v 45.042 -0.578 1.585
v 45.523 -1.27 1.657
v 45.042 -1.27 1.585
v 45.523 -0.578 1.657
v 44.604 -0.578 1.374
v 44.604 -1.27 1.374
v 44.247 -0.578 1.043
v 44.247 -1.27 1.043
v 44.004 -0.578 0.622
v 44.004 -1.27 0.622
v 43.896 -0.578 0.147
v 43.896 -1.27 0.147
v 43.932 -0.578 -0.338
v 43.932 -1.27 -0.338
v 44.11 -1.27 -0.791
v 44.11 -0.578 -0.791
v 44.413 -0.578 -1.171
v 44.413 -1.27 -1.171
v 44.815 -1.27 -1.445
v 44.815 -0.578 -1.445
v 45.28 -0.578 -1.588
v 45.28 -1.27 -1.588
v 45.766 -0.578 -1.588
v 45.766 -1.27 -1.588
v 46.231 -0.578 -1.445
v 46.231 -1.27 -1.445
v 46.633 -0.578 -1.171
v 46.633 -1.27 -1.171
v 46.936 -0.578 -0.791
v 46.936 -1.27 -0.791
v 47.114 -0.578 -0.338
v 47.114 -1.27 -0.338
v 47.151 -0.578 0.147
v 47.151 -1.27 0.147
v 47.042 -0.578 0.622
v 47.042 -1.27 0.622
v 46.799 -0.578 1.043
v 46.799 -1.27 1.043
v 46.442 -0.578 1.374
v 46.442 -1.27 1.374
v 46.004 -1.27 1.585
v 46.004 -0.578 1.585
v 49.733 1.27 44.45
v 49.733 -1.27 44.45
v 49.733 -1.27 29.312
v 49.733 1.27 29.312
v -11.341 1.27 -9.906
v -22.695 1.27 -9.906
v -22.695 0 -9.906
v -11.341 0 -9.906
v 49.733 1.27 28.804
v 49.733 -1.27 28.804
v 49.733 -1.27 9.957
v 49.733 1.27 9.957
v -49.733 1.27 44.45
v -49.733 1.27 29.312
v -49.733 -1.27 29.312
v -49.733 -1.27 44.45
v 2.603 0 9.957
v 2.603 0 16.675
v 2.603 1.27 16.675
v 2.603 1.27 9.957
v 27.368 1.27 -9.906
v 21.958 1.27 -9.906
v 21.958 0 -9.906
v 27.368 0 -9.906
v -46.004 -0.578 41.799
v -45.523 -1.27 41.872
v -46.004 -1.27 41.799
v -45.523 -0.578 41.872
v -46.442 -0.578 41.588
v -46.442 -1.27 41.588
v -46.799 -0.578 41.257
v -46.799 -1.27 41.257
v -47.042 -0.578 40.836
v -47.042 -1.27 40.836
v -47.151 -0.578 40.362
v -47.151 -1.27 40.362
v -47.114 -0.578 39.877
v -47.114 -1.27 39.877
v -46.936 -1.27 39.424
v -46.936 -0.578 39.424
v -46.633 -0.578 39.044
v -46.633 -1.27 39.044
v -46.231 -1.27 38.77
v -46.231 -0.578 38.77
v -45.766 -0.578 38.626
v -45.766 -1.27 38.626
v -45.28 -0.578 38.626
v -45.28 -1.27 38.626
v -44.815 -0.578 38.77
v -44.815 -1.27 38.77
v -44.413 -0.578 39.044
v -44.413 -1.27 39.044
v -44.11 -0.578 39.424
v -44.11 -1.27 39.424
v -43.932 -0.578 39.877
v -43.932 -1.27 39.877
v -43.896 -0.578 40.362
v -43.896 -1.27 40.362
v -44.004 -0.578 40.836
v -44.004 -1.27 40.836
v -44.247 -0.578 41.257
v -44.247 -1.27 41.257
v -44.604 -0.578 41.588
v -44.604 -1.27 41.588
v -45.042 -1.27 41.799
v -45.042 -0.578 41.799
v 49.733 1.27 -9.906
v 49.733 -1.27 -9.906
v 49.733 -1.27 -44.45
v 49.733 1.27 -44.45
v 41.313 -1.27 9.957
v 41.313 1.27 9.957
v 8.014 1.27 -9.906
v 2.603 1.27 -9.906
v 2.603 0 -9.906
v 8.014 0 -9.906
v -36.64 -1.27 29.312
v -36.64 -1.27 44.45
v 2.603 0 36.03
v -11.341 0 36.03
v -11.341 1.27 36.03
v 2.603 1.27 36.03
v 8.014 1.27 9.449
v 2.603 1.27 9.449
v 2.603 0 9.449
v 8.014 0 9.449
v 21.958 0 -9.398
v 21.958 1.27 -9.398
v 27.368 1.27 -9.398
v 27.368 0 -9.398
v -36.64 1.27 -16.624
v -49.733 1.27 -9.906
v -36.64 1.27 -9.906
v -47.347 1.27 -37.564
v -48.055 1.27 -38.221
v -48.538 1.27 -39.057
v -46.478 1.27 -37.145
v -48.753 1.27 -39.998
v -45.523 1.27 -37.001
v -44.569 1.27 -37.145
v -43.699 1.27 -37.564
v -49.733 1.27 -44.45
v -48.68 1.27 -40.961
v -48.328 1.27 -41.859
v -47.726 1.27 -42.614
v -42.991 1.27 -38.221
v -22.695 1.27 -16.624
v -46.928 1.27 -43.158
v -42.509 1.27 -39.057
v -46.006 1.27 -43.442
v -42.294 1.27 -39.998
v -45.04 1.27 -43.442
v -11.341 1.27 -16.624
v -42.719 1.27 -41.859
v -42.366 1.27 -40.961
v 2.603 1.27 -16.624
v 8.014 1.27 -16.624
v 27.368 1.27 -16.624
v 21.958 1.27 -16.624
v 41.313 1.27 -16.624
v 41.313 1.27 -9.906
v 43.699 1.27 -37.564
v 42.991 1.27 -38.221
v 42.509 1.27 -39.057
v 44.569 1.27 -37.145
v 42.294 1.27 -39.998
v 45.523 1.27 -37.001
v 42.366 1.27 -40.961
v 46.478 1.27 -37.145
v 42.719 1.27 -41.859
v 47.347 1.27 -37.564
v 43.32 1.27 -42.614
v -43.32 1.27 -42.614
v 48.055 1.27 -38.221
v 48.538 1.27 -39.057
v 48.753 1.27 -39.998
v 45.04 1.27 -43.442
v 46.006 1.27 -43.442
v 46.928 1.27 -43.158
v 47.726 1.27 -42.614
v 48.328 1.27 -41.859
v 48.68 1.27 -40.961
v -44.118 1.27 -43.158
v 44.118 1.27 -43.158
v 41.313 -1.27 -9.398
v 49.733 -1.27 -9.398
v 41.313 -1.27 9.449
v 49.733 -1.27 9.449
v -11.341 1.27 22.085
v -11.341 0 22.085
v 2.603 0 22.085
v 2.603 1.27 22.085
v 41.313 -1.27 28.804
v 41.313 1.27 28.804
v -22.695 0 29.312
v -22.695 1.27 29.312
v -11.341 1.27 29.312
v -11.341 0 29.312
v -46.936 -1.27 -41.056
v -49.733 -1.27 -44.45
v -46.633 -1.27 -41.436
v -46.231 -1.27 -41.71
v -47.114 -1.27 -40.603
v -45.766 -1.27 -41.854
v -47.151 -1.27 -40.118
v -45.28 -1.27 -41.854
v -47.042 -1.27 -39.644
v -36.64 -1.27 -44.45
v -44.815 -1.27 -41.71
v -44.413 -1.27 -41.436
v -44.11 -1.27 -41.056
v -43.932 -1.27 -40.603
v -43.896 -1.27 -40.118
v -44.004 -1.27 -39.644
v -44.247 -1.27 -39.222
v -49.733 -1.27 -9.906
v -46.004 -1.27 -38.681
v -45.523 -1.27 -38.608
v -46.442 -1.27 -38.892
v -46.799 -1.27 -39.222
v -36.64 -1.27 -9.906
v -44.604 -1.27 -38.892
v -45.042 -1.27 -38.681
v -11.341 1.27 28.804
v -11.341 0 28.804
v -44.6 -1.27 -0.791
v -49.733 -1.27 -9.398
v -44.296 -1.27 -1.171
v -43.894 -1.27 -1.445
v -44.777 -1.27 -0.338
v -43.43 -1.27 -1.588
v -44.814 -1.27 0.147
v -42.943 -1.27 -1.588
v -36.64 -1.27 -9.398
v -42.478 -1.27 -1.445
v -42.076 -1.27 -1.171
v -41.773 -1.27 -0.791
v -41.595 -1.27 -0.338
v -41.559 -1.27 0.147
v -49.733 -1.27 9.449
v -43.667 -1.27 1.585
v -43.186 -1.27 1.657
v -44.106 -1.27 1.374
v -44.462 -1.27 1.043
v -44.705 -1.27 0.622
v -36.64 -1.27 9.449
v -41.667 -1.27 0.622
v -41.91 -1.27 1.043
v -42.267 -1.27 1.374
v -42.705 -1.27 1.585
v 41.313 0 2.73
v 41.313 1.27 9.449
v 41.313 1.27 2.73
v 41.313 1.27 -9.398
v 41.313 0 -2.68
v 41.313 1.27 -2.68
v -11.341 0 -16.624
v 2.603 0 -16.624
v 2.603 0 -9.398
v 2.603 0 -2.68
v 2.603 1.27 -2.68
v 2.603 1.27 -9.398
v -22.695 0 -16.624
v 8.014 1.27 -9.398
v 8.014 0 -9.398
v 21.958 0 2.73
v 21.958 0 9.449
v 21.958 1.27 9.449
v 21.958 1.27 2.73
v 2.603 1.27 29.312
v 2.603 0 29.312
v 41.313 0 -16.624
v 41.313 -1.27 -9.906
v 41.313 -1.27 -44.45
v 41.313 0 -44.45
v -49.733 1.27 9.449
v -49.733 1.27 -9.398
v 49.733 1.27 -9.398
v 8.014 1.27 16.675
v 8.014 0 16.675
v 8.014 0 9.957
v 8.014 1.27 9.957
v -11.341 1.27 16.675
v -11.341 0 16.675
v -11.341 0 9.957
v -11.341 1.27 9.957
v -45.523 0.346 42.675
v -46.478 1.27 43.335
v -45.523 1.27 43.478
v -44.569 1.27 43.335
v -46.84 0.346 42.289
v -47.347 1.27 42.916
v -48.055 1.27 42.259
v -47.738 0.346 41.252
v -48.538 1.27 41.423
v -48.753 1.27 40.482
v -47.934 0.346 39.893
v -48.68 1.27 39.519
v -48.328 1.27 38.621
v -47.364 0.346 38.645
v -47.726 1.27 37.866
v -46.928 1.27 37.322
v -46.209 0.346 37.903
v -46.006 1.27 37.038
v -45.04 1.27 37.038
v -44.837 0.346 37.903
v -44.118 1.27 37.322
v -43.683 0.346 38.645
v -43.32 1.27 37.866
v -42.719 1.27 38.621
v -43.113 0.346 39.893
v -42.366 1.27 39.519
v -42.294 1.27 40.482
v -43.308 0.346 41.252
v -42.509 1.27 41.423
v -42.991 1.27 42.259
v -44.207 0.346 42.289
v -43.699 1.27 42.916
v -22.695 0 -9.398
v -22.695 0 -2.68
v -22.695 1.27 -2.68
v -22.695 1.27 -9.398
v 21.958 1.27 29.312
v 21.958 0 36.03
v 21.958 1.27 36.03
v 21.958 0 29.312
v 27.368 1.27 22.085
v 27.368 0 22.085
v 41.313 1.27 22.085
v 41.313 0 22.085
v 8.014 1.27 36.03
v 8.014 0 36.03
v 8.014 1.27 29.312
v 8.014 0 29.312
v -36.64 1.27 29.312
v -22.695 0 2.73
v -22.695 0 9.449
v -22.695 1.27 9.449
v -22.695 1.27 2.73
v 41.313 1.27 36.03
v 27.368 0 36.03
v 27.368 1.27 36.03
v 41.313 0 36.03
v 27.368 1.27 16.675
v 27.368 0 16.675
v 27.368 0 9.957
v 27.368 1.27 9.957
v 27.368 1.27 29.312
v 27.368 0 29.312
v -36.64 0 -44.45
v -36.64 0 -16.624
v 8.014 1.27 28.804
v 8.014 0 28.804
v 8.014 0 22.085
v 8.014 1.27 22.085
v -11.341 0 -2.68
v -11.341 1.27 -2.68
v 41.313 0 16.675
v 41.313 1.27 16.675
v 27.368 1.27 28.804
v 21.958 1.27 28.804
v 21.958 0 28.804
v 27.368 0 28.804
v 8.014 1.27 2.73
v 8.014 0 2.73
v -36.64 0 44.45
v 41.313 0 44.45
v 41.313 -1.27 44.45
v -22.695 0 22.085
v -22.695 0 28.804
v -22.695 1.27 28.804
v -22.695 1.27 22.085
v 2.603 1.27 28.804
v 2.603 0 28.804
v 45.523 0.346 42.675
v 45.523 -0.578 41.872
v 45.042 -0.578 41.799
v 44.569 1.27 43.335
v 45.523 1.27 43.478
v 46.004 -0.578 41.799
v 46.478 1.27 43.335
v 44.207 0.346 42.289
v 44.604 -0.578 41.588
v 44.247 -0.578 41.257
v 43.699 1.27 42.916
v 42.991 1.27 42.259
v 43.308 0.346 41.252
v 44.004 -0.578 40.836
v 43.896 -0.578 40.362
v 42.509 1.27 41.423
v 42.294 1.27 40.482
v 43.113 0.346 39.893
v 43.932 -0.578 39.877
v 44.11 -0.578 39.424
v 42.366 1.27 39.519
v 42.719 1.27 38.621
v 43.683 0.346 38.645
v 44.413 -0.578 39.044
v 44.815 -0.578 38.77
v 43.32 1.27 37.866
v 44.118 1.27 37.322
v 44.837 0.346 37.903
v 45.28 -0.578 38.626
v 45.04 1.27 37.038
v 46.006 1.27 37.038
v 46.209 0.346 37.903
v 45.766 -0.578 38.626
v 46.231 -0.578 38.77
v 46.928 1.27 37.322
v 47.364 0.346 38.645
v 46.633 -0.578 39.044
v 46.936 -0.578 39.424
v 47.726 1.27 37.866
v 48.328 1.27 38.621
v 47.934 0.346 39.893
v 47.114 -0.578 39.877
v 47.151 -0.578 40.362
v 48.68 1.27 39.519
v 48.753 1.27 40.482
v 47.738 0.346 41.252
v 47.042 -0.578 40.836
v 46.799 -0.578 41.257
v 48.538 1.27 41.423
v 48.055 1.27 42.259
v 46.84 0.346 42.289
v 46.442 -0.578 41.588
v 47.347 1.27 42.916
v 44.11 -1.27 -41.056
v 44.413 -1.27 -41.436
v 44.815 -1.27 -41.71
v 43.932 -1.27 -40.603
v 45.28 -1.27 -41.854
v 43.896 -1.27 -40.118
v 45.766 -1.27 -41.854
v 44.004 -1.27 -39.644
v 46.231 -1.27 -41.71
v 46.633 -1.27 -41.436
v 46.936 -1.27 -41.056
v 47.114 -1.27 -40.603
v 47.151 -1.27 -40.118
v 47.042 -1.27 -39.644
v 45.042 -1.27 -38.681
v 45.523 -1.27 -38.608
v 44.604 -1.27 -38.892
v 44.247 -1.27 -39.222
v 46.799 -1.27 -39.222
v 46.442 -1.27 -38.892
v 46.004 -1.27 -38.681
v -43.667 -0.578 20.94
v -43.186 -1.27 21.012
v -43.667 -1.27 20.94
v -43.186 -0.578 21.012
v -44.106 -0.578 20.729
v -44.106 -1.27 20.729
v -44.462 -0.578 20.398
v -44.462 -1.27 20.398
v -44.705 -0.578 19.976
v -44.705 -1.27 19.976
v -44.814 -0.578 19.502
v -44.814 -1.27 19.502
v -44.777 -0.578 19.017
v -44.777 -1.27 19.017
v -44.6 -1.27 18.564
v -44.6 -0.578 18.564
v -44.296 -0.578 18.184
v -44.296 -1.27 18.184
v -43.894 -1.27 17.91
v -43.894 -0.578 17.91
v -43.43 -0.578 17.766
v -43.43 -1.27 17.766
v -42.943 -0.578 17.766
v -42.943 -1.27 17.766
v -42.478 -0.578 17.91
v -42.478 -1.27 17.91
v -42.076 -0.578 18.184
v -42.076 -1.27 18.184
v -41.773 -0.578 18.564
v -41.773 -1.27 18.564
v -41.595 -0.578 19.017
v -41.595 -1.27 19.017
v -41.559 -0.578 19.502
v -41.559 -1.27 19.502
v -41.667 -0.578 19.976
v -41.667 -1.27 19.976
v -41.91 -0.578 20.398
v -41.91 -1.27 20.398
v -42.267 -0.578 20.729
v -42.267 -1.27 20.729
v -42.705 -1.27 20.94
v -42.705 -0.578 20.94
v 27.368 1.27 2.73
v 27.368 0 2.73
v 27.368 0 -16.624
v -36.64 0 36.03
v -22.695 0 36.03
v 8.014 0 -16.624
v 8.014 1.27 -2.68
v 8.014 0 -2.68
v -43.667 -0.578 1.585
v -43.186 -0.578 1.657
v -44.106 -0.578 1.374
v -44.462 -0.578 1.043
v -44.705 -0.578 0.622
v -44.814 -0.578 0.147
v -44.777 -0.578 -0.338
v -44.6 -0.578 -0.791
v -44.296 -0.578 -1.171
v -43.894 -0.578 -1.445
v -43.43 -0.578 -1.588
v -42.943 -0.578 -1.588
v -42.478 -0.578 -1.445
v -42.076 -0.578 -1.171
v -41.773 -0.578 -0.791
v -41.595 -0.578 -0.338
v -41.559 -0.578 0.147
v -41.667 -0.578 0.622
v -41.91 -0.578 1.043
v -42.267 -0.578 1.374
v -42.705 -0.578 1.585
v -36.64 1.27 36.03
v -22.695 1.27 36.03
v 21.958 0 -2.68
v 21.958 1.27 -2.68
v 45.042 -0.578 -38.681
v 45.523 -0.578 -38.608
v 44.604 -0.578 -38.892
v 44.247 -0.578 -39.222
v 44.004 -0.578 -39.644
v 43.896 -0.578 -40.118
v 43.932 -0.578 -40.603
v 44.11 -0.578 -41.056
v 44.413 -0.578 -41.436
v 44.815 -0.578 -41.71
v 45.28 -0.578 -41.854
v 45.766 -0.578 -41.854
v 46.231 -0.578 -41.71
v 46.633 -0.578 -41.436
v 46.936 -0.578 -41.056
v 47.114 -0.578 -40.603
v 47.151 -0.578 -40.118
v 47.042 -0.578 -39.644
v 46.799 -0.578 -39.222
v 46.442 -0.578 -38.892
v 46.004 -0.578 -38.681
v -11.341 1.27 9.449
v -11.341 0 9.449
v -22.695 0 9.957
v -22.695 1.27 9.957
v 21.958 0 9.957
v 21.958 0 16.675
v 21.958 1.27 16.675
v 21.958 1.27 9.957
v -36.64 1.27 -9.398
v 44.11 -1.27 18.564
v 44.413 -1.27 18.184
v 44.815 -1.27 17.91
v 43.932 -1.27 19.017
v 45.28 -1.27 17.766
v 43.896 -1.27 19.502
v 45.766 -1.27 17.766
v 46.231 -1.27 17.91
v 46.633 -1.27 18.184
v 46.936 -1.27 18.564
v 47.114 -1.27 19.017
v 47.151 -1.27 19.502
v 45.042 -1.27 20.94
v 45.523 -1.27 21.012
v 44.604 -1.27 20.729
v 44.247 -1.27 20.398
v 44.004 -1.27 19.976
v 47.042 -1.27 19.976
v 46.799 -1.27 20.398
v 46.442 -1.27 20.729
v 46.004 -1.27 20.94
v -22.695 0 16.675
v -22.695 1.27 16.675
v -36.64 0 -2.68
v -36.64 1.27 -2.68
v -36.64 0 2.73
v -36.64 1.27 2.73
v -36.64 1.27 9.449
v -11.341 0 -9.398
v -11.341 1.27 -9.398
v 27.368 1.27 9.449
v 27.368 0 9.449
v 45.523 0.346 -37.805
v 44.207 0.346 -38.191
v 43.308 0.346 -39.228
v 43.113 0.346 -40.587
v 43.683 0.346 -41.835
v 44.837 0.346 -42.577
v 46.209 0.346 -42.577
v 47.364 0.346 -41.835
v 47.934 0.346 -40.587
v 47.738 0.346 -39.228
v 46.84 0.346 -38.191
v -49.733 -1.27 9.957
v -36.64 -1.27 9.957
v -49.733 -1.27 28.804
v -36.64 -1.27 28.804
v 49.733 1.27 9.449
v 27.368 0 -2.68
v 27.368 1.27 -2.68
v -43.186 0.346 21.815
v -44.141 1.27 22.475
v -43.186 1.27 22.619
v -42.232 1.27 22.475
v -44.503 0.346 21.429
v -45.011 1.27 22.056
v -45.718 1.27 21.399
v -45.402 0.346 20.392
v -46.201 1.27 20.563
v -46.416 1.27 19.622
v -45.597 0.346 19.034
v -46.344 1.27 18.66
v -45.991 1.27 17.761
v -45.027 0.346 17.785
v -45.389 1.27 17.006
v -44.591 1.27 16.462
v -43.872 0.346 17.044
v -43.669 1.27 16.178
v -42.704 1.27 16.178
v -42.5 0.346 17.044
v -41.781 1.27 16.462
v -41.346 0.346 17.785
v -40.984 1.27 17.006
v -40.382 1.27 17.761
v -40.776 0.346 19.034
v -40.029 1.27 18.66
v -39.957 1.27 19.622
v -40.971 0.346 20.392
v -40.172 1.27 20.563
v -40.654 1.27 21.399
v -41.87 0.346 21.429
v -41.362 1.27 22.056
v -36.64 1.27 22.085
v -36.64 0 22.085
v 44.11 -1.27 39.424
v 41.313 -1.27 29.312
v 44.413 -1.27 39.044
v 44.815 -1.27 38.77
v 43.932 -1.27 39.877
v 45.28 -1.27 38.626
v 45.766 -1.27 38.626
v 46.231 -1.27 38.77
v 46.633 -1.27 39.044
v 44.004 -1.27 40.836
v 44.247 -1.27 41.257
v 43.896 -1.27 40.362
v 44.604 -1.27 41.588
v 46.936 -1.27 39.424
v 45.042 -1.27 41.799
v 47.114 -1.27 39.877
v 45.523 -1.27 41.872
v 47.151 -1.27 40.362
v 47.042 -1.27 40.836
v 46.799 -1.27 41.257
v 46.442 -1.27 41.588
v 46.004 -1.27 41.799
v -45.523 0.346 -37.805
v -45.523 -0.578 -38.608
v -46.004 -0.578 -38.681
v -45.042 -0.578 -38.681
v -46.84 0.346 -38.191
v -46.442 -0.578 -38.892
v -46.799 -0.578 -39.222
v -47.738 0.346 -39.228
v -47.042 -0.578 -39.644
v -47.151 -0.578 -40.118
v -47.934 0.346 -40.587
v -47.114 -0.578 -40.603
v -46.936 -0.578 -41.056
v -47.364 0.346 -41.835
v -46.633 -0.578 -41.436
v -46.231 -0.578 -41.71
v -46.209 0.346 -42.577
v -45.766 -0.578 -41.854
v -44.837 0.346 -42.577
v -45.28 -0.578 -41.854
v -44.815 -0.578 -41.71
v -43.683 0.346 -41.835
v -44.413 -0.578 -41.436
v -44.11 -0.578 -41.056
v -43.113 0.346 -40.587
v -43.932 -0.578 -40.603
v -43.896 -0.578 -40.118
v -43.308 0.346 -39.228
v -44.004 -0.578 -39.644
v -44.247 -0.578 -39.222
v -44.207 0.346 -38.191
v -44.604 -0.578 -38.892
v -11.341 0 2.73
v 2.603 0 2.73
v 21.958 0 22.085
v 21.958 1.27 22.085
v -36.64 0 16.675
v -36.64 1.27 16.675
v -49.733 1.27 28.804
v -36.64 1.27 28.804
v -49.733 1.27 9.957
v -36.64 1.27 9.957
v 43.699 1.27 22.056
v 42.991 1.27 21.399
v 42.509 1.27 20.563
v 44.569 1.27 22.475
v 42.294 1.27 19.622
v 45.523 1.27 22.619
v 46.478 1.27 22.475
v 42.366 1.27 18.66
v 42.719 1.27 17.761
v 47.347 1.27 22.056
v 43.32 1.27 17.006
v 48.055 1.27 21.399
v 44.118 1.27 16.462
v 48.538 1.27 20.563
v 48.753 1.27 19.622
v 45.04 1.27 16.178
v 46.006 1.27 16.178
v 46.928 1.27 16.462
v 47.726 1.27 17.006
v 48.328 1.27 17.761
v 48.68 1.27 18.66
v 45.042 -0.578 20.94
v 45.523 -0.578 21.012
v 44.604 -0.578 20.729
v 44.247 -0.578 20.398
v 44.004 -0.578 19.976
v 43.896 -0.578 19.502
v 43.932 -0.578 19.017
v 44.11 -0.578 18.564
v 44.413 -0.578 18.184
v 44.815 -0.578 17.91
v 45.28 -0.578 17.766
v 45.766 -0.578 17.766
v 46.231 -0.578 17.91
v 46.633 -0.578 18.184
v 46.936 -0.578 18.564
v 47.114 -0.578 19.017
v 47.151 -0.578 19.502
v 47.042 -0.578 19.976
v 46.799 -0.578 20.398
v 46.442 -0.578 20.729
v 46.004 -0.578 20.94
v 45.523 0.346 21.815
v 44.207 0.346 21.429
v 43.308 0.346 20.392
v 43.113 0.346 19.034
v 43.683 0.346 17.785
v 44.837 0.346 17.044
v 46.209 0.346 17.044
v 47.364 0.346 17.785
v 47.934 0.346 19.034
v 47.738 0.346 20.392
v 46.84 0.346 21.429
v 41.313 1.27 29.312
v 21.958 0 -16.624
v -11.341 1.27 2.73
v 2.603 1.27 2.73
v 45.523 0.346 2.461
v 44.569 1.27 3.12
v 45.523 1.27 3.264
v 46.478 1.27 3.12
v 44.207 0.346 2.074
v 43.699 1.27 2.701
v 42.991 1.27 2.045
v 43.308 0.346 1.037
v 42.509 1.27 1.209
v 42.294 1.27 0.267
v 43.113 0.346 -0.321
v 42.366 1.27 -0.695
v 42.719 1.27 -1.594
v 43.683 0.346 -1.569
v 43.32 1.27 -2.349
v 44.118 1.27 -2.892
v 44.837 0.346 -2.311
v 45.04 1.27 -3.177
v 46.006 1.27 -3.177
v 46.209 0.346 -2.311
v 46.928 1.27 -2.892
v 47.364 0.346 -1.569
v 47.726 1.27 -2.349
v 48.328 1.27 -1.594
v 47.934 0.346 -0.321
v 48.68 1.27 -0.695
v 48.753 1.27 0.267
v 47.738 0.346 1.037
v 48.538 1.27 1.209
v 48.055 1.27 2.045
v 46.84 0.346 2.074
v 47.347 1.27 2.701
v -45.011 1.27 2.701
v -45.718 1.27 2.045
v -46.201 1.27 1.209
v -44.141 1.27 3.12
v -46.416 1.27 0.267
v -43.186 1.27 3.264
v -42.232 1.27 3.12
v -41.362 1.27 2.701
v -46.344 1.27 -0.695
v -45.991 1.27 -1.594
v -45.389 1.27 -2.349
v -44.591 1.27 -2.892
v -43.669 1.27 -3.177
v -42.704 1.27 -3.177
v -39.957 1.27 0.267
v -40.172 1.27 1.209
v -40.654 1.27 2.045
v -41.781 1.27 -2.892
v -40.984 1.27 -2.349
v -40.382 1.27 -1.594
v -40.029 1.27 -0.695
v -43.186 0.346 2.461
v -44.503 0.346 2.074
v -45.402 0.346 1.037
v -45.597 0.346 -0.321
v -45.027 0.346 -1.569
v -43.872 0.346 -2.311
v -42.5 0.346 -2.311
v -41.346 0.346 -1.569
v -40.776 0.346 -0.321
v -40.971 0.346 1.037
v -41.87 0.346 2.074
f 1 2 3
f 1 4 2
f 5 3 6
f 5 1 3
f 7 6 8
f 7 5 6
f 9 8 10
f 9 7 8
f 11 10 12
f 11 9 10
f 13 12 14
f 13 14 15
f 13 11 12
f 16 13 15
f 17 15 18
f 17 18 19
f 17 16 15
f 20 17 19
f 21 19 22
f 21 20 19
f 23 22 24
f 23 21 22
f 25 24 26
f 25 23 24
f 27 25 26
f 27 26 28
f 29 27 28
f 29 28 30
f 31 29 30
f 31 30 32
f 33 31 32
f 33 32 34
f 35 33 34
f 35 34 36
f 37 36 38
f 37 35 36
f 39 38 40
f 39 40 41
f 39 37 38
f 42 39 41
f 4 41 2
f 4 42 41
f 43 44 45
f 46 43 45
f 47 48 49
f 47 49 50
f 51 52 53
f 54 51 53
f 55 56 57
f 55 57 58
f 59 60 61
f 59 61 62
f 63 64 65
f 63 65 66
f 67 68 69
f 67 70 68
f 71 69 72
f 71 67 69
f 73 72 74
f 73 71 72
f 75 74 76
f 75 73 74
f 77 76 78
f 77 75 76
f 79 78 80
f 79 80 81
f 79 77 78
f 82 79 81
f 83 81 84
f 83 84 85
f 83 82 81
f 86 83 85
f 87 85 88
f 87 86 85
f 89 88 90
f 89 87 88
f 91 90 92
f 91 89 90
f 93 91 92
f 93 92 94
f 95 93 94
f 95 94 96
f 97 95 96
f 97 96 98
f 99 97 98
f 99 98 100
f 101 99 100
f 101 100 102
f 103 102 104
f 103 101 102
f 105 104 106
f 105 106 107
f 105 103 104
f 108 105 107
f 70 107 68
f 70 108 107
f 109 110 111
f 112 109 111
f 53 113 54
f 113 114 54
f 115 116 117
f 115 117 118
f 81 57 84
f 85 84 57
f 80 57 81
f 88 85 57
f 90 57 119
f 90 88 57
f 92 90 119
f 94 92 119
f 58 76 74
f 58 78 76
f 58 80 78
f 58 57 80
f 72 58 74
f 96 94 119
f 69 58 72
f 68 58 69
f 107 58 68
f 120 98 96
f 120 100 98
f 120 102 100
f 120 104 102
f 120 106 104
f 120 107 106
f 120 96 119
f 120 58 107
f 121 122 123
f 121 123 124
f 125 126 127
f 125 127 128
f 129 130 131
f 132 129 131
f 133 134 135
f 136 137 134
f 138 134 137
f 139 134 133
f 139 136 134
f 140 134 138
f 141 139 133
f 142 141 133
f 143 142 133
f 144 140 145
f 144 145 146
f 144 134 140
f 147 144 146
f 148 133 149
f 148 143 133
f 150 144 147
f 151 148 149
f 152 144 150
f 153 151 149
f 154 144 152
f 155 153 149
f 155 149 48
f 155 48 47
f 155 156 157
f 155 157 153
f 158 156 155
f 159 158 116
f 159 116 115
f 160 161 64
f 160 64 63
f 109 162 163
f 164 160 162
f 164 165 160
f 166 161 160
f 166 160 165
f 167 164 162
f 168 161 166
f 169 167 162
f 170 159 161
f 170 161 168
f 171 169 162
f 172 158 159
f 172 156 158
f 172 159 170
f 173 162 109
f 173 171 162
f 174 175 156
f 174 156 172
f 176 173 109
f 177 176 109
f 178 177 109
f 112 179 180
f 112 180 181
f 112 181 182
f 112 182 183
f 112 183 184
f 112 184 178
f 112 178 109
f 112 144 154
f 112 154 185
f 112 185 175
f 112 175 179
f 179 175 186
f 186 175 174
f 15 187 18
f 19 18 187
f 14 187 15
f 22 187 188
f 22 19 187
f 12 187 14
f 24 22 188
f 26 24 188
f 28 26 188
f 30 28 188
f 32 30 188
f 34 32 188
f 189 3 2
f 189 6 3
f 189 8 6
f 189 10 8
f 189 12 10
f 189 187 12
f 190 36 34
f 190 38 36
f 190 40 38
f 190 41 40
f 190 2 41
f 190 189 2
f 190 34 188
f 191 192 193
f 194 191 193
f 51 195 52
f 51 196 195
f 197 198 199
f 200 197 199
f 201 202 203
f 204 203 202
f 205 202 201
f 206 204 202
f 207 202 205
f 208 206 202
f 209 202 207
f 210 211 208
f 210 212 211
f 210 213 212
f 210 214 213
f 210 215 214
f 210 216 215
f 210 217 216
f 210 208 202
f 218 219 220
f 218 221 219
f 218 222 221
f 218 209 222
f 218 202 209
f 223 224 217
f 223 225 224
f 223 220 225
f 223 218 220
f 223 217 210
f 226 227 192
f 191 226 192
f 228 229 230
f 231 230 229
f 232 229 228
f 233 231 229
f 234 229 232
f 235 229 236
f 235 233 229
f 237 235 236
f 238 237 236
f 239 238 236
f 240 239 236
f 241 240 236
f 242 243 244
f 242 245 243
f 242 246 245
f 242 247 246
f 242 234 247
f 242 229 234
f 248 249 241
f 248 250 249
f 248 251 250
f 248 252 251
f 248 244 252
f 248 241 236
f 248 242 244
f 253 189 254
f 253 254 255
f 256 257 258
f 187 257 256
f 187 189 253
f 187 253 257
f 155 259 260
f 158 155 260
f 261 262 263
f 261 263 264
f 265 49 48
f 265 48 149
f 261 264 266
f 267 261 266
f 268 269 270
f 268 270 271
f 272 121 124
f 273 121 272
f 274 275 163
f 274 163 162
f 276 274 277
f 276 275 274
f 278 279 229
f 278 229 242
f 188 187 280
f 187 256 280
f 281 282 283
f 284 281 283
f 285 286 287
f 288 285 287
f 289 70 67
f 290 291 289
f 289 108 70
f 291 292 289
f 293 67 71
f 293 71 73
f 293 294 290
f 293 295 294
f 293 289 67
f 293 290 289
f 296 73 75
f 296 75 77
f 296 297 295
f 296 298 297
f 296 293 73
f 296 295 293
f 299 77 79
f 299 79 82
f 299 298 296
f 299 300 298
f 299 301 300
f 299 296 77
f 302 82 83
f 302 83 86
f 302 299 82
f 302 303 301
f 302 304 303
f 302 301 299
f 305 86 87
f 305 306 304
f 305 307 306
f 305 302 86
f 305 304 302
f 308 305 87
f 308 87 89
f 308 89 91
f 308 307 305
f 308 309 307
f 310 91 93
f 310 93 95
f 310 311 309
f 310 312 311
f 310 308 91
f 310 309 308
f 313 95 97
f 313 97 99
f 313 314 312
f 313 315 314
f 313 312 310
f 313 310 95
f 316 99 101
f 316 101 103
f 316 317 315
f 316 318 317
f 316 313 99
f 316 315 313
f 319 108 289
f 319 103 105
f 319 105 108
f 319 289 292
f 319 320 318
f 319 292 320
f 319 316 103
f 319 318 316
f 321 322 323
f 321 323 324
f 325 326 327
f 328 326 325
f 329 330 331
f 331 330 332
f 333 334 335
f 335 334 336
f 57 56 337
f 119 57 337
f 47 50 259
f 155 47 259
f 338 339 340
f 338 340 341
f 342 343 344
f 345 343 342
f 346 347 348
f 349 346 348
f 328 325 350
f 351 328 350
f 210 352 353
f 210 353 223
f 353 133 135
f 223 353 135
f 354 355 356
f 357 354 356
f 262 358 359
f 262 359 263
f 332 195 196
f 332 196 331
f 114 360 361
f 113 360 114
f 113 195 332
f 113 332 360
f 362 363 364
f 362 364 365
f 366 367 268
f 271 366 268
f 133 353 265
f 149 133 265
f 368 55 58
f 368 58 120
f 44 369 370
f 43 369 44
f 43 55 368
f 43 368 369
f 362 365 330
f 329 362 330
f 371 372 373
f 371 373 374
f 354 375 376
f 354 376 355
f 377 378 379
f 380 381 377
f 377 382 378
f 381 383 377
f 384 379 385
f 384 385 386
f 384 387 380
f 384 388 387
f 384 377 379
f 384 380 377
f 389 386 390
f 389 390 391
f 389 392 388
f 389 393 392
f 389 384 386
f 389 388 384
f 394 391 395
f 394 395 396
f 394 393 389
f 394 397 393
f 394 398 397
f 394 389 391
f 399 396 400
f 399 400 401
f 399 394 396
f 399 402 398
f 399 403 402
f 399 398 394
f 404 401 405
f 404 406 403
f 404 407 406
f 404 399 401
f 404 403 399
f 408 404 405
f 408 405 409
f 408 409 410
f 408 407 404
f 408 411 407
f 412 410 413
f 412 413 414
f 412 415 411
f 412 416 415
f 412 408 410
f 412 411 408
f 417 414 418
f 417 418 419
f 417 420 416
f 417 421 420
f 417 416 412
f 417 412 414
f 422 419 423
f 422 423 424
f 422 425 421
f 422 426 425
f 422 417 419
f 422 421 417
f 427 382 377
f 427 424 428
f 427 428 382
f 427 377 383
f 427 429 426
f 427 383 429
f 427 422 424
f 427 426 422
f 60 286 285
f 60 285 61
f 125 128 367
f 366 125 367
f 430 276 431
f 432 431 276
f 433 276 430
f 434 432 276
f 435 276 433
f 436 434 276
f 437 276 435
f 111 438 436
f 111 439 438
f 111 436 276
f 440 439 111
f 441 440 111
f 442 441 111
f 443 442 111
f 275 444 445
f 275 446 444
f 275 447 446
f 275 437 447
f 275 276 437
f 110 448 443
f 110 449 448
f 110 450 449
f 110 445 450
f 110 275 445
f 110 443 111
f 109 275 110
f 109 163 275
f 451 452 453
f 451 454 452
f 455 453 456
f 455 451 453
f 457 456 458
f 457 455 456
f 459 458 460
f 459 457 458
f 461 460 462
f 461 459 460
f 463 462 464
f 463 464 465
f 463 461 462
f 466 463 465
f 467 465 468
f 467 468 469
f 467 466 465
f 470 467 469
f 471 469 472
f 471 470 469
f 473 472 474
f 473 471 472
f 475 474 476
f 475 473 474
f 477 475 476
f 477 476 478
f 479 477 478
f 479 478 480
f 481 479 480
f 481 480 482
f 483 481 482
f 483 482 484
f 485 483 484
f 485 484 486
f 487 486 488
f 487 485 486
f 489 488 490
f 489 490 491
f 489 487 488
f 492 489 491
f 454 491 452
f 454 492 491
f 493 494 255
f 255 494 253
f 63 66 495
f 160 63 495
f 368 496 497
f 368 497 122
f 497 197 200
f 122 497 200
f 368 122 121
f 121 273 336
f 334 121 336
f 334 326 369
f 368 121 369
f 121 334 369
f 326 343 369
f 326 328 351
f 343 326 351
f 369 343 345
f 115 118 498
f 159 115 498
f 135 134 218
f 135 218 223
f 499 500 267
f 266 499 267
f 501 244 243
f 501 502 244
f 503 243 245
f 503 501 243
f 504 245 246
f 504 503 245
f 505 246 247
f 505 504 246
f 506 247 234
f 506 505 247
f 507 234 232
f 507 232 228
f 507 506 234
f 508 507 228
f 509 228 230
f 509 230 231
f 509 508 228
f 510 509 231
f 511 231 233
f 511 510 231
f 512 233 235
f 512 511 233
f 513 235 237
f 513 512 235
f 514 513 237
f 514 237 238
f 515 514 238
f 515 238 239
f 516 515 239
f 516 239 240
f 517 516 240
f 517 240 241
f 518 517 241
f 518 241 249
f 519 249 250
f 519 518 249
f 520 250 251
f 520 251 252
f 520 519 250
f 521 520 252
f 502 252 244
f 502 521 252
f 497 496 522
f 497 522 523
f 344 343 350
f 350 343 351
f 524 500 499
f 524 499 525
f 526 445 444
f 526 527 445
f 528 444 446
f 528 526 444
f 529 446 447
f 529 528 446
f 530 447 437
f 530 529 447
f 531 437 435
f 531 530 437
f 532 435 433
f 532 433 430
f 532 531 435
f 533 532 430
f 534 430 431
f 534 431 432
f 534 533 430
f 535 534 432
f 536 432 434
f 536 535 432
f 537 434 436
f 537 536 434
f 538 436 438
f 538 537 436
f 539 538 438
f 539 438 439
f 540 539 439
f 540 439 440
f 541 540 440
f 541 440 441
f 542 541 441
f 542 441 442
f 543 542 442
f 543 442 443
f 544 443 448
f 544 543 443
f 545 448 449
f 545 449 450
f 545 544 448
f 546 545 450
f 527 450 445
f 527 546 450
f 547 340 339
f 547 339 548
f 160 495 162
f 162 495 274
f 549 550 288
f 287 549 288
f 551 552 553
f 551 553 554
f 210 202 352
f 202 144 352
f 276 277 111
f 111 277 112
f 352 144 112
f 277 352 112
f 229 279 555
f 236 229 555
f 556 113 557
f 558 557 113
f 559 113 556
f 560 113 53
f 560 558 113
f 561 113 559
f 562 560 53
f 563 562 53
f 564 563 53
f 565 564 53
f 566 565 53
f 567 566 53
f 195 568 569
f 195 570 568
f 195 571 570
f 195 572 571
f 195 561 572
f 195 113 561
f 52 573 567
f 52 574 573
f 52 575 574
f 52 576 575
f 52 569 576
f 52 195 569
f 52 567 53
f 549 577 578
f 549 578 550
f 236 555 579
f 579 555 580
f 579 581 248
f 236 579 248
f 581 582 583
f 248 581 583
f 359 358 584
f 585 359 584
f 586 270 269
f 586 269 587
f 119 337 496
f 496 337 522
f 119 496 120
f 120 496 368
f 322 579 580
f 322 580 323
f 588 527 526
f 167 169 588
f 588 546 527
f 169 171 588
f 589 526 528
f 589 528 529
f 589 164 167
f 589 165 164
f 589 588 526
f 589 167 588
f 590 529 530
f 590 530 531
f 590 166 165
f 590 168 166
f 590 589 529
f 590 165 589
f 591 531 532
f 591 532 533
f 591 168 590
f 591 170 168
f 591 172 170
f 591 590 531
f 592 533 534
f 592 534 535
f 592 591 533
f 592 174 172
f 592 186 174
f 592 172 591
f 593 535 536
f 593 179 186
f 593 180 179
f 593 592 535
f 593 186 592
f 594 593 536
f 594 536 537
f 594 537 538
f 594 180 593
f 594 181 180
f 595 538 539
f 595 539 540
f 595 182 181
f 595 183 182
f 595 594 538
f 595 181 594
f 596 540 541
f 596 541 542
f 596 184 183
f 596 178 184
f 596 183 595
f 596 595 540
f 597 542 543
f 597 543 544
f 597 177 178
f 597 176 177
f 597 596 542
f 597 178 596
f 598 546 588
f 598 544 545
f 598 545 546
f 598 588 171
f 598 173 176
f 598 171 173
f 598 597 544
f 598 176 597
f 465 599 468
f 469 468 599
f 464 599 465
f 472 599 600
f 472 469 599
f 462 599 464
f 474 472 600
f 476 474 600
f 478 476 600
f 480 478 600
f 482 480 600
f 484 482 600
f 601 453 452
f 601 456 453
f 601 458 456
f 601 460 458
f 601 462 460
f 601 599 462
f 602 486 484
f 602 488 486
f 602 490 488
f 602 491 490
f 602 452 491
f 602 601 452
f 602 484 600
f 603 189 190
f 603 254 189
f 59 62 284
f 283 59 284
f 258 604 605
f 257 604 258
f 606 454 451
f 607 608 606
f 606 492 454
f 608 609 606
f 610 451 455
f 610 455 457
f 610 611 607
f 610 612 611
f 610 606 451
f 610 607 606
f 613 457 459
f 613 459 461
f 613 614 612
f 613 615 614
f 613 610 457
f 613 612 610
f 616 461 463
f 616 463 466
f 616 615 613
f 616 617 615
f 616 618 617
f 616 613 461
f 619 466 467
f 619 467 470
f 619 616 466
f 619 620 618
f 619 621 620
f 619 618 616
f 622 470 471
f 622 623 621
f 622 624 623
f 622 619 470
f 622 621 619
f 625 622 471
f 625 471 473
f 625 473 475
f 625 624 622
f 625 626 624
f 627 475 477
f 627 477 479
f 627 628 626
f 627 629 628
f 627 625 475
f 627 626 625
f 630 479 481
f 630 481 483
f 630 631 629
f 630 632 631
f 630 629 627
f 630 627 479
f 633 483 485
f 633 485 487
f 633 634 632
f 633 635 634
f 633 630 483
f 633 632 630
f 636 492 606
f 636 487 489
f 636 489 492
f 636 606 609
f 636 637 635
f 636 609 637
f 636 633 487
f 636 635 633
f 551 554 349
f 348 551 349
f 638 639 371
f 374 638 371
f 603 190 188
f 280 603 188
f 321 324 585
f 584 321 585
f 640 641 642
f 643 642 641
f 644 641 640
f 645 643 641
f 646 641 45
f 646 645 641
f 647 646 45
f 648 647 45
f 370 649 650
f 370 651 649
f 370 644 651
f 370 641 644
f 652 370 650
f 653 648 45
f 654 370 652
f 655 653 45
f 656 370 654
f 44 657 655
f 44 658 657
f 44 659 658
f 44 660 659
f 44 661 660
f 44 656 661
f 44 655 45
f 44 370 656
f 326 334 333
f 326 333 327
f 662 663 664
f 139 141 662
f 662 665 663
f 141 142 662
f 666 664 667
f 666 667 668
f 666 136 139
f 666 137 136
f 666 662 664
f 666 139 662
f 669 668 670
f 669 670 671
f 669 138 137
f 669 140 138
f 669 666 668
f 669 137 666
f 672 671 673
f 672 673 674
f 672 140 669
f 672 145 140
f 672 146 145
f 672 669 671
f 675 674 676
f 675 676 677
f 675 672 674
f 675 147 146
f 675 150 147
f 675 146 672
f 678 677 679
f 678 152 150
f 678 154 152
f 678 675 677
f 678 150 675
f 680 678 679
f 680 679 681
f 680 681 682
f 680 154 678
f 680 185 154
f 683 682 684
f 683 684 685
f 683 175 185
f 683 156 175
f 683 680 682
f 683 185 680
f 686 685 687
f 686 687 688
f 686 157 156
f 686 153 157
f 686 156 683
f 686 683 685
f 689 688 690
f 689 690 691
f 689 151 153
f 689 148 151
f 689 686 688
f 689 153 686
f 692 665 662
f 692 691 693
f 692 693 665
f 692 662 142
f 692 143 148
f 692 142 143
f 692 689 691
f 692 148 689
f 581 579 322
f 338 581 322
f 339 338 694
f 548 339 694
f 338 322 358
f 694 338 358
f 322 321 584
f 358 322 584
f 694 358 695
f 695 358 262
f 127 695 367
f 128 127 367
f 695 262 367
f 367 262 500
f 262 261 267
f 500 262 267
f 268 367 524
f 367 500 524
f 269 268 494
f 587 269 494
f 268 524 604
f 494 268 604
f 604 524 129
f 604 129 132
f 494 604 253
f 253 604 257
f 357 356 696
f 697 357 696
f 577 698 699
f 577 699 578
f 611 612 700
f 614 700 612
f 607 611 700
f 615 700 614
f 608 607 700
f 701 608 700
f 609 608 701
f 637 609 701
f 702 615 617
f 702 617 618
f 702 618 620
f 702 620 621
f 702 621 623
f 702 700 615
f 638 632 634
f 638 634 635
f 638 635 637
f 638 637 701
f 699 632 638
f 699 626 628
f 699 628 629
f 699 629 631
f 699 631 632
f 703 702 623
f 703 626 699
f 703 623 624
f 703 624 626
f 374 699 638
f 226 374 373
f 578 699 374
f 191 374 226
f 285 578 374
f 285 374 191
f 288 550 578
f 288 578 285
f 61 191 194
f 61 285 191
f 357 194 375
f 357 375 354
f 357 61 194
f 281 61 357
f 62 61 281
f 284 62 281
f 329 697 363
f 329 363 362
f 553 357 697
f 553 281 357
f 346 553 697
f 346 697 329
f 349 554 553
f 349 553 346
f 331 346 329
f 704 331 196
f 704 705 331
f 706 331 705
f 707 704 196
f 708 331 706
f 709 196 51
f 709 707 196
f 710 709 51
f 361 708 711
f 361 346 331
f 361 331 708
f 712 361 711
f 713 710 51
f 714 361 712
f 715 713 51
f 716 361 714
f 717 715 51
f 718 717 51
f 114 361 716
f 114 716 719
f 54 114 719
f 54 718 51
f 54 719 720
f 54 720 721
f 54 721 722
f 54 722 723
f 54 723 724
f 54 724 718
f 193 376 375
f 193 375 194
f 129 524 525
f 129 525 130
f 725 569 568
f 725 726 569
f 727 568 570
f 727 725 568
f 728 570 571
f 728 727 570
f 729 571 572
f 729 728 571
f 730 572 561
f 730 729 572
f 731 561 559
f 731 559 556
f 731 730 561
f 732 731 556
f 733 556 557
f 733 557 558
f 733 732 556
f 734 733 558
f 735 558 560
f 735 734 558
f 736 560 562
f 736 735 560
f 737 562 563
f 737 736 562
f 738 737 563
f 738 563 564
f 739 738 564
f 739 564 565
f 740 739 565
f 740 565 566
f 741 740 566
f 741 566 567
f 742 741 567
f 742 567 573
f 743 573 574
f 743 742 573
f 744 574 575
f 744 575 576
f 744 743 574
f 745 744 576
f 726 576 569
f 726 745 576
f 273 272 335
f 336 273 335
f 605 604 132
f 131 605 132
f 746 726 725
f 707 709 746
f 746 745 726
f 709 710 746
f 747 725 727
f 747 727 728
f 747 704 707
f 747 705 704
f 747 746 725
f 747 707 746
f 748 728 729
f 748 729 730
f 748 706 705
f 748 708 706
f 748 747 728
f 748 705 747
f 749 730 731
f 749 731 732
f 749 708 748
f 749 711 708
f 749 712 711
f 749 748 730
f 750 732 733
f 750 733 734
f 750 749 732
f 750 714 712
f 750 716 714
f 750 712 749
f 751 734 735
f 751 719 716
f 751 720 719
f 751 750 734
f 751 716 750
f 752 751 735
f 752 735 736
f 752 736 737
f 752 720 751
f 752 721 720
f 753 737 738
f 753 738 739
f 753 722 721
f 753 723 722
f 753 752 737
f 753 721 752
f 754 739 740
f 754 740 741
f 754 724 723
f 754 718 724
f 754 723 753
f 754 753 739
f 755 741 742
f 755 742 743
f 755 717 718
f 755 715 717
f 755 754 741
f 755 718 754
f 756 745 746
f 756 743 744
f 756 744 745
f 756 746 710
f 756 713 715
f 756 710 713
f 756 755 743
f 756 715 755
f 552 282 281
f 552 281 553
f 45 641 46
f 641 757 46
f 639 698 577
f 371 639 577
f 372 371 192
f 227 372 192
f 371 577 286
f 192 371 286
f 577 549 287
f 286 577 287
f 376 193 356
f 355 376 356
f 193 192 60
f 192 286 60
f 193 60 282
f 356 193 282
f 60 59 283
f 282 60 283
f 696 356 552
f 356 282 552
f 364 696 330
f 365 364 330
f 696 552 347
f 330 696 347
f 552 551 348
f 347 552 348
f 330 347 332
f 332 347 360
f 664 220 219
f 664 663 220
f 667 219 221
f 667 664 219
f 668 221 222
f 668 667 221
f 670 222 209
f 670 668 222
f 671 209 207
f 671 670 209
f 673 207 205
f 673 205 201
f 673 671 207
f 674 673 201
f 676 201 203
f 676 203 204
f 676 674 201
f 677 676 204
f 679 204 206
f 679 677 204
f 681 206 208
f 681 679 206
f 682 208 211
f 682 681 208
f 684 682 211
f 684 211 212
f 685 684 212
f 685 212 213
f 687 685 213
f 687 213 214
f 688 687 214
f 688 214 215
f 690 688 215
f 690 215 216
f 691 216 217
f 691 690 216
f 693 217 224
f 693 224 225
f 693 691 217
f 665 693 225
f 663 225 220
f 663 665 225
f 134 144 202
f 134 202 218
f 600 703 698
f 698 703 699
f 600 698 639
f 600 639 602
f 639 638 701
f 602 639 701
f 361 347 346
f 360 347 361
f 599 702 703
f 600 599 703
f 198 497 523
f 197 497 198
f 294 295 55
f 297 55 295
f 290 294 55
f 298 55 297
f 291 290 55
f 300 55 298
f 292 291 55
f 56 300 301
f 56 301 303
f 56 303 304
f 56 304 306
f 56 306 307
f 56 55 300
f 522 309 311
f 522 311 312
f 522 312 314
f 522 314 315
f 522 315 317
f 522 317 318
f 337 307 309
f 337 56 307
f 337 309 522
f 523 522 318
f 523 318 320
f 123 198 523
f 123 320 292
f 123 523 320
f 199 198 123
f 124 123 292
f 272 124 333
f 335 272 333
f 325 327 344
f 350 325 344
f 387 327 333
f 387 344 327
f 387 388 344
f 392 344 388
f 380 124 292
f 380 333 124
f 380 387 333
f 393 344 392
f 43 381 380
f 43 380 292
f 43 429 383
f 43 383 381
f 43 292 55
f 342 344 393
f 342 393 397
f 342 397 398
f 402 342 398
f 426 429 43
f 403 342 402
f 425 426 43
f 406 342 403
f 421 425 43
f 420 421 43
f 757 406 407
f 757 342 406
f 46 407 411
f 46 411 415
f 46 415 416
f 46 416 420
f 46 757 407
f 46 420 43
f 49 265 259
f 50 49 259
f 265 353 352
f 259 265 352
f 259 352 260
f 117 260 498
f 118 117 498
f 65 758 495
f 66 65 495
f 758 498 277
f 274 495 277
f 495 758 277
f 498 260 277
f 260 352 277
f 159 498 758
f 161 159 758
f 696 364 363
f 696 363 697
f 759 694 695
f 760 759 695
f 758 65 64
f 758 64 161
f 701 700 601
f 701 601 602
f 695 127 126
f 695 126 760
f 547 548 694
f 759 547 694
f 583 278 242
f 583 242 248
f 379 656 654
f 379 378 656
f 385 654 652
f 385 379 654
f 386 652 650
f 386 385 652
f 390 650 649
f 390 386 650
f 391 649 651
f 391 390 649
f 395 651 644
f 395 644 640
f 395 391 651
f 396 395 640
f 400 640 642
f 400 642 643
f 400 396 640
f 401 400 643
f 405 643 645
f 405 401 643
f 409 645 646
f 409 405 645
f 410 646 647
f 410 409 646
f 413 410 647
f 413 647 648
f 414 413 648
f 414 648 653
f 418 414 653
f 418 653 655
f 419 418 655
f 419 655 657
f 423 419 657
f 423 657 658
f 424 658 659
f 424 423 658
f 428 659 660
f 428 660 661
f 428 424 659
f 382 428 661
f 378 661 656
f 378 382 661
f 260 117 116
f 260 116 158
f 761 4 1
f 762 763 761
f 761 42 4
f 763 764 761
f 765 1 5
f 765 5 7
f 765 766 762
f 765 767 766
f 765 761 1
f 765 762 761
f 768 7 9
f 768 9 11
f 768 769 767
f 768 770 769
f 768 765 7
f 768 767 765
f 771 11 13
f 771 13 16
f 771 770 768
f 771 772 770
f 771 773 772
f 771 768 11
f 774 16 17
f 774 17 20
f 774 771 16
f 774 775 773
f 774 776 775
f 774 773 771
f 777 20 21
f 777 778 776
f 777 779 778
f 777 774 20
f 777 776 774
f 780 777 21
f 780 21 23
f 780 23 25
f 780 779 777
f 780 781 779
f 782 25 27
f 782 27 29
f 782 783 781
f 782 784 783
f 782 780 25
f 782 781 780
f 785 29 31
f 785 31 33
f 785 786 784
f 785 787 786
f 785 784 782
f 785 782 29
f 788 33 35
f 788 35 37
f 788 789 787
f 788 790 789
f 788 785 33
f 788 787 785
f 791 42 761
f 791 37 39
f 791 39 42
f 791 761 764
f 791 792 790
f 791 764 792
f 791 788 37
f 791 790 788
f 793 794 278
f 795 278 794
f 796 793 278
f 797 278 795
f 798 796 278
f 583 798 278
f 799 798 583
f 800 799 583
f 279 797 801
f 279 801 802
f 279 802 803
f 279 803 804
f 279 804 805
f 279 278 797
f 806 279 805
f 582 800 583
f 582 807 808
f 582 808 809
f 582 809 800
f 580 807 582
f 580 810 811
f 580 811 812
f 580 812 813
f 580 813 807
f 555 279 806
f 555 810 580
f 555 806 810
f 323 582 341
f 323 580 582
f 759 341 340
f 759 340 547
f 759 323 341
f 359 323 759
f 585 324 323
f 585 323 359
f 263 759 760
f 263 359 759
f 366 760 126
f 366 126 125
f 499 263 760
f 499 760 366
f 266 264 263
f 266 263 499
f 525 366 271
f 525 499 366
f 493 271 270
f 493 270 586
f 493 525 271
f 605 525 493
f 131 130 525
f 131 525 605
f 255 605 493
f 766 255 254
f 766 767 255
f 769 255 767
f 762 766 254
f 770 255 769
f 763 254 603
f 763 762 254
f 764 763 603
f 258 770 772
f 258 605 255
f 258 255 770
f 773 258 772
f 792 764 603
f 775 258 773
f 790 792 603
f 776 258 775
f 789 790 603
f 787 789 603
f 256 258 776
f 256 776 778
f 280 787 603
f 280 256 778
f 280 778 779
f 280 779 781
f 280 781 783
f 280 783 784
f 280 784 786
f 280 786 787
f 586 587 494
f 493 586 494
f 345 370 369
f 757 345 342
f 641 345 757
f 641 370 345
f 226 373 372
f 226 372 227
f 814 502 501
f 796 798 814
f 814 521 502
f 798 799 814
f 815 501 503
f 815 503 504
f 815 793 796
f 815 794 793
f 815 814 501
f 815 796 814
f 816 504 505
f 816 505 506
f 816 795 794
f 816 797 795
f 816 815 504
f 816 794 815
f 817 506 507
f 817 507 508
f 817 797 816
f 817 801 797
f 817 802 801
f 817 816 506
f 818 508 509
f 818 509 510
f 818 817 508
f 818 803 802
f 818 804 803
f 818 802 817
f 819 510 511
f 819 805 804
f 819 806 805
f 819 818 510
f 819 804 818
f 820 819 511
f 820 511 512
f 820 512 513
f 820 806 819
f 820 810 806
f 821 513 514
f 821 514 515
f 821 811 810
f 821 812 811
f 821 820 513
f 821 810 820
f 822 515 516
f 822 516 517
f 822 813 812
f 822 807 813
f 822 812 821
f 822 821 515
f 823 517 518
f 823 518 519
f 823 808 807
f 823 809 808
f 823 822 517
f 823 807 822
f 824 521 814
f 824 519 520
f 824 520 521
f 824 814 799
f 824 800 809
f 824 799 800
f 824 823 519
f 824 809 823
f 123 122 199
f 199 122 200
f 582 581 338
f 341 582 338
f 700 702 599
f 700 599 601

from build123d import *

# Parameters (mm, degrees)
SKETCH1_W                                     = 99.4664
SKETCH1_H                                     = 88.9
SKETCH1_W_2                                   = 13.9446
SKETCH1_H_2                                   = 13.9446
BOSS_EXTRUDE1_DEPTH                           = 1.27
SKETCH6_W                                     = 13.0937
SKETCH6_H                                     = 88.9
SKETCH6_W_2                                   = 8.4201
BOSS_EXTRUDE2_DEPTH                           = 1.27
SKETCH2_W                                     = 99.4664
SKETCH2_H                                     = 0.508
CUT_EXTRUDE_THIN2_DEPTH                       = 67.750620089
CSK_FOR_4_FLAT_HEAD_SOCKET_CAP_SCREW1_A_COUNT = 2
CSK_FOR_4_FLAT_HEAD_SOCKET_CAP_SCREW1_A_PITCH = 91.0463
CSK_FOR_4_FLAT_HEAD_SOCKET_CAP_SCRE_2_COUNT   = 2
CSK_FOR_4_FLAT_HEAD_SOCKET_CAP_SCRE_2_PITCH   = 121.517254115
CSK_FOR_4_FLAT_HEAD_SOCKET_CAP_SCRE_3_COUNT   = 2
CSK_FOR_4_FLAT_HEAD_SOCKET_CAP_SCRE_3_PITCH   = 80.4799
CSK_FOR_4_FLAT_HEAD_SOCKET_CAP_SCRE_4_COUNT   = 2
CSK_FOR_4_FLAT_HEAD_SOCKET_CAP_SCRE_4_PITCH   = 40.333101106
CSK_FOR_4_FLAT_HEAD_SOCKET_CAP_SCRE_5_COUNT   = 2
CSK_FOR_4_FLAT_HEAD_SOCKET_CAP_SCRE_5_PITCH   = 59.665927633
CSK_FOR_4_FLAT_HEAD_SOCKET_CAP_SCRE_6_COUNT   = 2
CSK_FOR_4_FLAT_HEAD_SOCKET_CAP_SCRE_6_PITCH   = 108.830101671
CSK_FOR_4_FLAT_HEAD_SOCKET_CAP_SCRE_7_COUNT   = 2
CSK_FOR_4_FLAT_HEAD_SOCKET_CAP_SCRE_7_PITCH   = 99.552635095


with BuildPart() as part:
    # Sketch1 → Boss-Extrude1 (new body)
    with BuildSketch(Plane(origin=(0, 0, 0), x_dir=(1, 0, 0), z_dir=(0, 1, 0))):
        Rectangle(SKETCH1_W, SKETCH1_H)
        with Locations((-4.3688, 9.652)):
            Rectangle(SKETCH1_W_2, SKETCH1_H_2, mode=Mode.SUBTRACT)
        with Locations((14.986, 9.652)):
            Rectangle(SKETCH1_W_2, SKETCH1_H_2, mode=Mode.SUBTRACT)
        with Locations((34.3408, 9.652)):
            Rectangle(SKETCH1_W_2, SKETCH1_H_2, mode=Mode.SUBTRACT)
        with Locations((-4.3688, -9.7028)):
            Rectangle(SKETCH1_W_2, SKETCH1_H_2, mode=Mode.SUBTRACT)
        with Locations((14.986, -9.7028)):
            Rectangle(SKETCH1_W_2, SKETCH1_H_2, mode=Mode.SUBTRACT)
        with Locations((34.3408, -9.7028)):
            Rectangle(SKETCH1_W_2, SKETCH1_H_2, mode=Mode.SUBTRACT)
        with Locations((-4.3688, -29.0576)):
            Rectangle(SKETCH1_W_2, SKETCH1_H_2, mode=Mode.SUBTRACT)
        with Locations((14.986, -29.0576)):
            Rectangle(SKETCH1_W_2, SKETCH1_H_2, mode=Mode.SUBTRACT)
        with Locations((34.3408, -29.0576)):
            Rectangle(SKETCH1_W_2, SKETCH1_H_2, mode=Mode.SUBTRACT)
        with Locations((-29.6672, 9.652)):
            Rectangle(SKETCH1_W_2, SKETCH1_H_2, mode=Mode.SUBTRACT)
        with Locations((-29.6672, -9.7028)):
            Rectangle(SKETCH1_W_2, SKETCH1_H_2, mode=Mode.SUBTRACT)
        with Locations((-29.6672, -29.0576)):
            Rectangle(SKETCH1_W_2, SKETCH1_H_2, mode=Mode.SUBTRACT)
    extrude(amount=BOSS_EXTRUDE1_DEPTH)

    # Sketch6 → Boss-Extrude2 (add)
    with BuildSketch(Plane.XZ):
        with Locations((-43.18635, 0)):
            Rectangle(SKETCH6_W, SKETCH6_H)
        with Locations((45.52315, 0)):
            Rectangle(SKETCH6_W_2, SKETCH6_H)
    extrude(amount=BOSS_EXTRUDE2_DEPTH)

    # Sketch2 → Cut-Extrude-Thin2 (cut, through all)
    with BuildSketch(Plane(origin=(0, 1.27, 0), x_dir=(1, 0, 0), z_dir=(0, 1, 0))):
        with Locations((0, 9.652)):
            Rectangle(SKETCH2_W, SKETCH2_H)
        with Locations((0, -9.7028)):
            Rectangle(SKETCH2_W, SKETCH2_H)
        with Locations((0, -29.0576)):
            Rectangle(SKETCH2_W, SKETCH2_H)
    extrude(amount=-CUT_EXTRUDE_THIN2_DEPTH, mode=Mode.SUBTRACT)


with BuildPart() as cut_extrude_thin2_piece_1:
    # of the separate pieces the step leaves, piece 1, a body of its own (cut_extrude_thin2_pieces)
    add(part.part.solids().sort_by_distance((-49.7332, 1.27, -44.45))[0])

    # Sketch7 → CSK for #4 Flat Head Socket Cap Screw1 (revolve, cut)
    with BuildSketch(Plane(origin=(-45.52315, 1.27, -40.23995), x_dir=(0, 0, 1), z_dir=(1, 0, 0))):
        Polygon((0, 0), (0, 2.54), (1.63195, 2.54), (1.63195, 1.848124365), (3.2385, 0), align=None)
    csk_for_4_flat_head_socket_cap_screw1 = revolve(axis=Axis((-45.52315, 7.62, -40.23995), (0, -1, 0)), mode=Mode.SUBTRACT)

    # CSK for #4 Flat Head Socket Cap Screw1 a: CSK for #4 Flat Head Socket Cap Screw1 ×2
    with Locations(*[(i * CSK_FOR_4_FLAT_HEAD_SOCKET_CAP_SCREW1_A_PITCH, 0, 0) for i in range(1, CSK_FOR_4_FLAT_HEAD_SOCKET_CAP_SCREW1_A_COUNT)]):
        add(csk_for_4_flat_head_socket_cap_screw1, mode=Mode.SUBTRACT)


with BuildPart() as cut_extrude_thin2_piece_2:
    # of the separate pieces the step leaves, piece 2, a body of its own (cut_extrude_thin2_pieces)
    add(part.part.solids().sort_by_distance((-49.7332, 1.27, -9.398))[0])

    # CSK for _4 Flat Head Socket Cap Scre 4: CSK for #4 Flat Head Socket Cap Screw1 ×2
    with Locations(*[Vector(0.057937523669032404, 0, 0.9983202108297219) * (i * CSK_FOR_4_FLAT_HEAD_SOCKET_CAP_SCRE_4_PITCH) for i in range(1, CSK_FOR_4_FLAT_HEAD_SOCKET_CAP_SCRE_4_COUNT)]):
        add(csk_for_4_flat_head_socket_cap_screw1, mode=Mode.SUBTRACT)

    # CSK for _4 Flat Head Socket Cap Scre 7: CSK for #4 Flat Head Socket Cap Screw1 ×2
    with Locations(*[Vector(0.9145543954042744, 0, 0.4044629251819284) * (i * CSK_FOR_4_FLAT_HEAD_SOCKET_CAP_SCRE_7_PITCH) for i in range(1, CSK_FOR_4_FLAT_HEAD_SOCKET_CAP_SCRE_7_COUNT)]):
        add(csk_for_4_flat_head_socket_cap_screw1, mode=Mode.SUBTRACT)


with BuildPart() as cut_extrude_thin2_piece_3:
    # of the separate pieces the step leaves, piece 3, a body of its own (cut_extrude_thin2_pieces)
    add(part.part.solids().sort_by_distance((-49.7332, 1.27, 9.9568))[0])

    # CSK for _4 Flat Head Socket Cap Scre 5: CSK for #4 Flat Head Socket Cap Screw1 ×2
    with Locations(*[Vector(0.03916473090618548, 0, 0.9992327676037481) * (i * CSK_FOR_4_FLAT_HEAD_SOCKET_CAP_SCRE_5_PITCH) for i in range(1, CSK_FOR_4_FLAT_HEAD_SOCKET_CAP_SCRE_5_COUNT)]):
        add(csk_for_4_flat_head_socket_cap_screw1, mode=Mode.SUBTRACT)

    # CSK for _4 Flat Head Socket Cap Scre 6: CSK for #4 Flat Head Socket Cap Screw1 ×2
    with Locations(*[Vector(0.8365911508129258, 0, 0.5478277524747213) * (i * CSK_FOR_4_FLAT_HEAD_SOCKET_CAP_SCRE_6_PITCH) for i in range(1, CSK_FOR_4_FLAT_HEAD_SOCKET_CAP_SCRE_6_COUNT)]):
        add(csk_for_4_flat_head_socket_cap_screw1, mode=Mode.SUBTRACT)


with BuildPart() as cut_extrude_thin2_piece_4:
    # of the separate pieces the step leaves, piece 4, a body of its own (cut_extrude_thin2_pieces)
    add(part.part.solids().sort_by_distance((-49.7332, 1.27, 44.45))[0])

    # CSK for _4 Flat Head Socket Cap Scre 2: CSK for #4 Flat Head Socket Cap Screw1 ×2
    with Locations(*[Vector(0.7492458635847796, 0, 0.6622919566936457) * (i * CSK_FOR_4_FLAT_HEAD_SOCKET_CAP_SCRE_2_PITCH) for i in range(1, CSK_FOR_4_FLAT_HEAD_SOCKET_CAP_SCRE_2_COUNT)]):
        add(csk_for_4_flat_head_socket_cap_screw1, mode=Mode.SUBTRACT)

    # CSK for _4 Flat Head Socket Cap Scre 3: CSK for #4 Flat Head Socket Cap Screw1 ×2
    with Locations(*[(0, 0, i * CSK_FOR_4_FLAT_HEAD_SOCKET_CAP_SCRE_3_PITCH) for i in range(1, CSK_FOR_4_FLAT_HEAD_SOCKET_CAP_SCRE_3_COUNT)]):
        add(csk_for_4_flat_head_socket_cap_screw1, mode=Mode.SUBTRACT)


solid = Compound([cut_extrude_thin2_piece_1.part, cut_extrude_thin2_piece_2.part, cut_extrude_thin2_piece_3.part, cut_extrude_thin2_piece_4.part])
